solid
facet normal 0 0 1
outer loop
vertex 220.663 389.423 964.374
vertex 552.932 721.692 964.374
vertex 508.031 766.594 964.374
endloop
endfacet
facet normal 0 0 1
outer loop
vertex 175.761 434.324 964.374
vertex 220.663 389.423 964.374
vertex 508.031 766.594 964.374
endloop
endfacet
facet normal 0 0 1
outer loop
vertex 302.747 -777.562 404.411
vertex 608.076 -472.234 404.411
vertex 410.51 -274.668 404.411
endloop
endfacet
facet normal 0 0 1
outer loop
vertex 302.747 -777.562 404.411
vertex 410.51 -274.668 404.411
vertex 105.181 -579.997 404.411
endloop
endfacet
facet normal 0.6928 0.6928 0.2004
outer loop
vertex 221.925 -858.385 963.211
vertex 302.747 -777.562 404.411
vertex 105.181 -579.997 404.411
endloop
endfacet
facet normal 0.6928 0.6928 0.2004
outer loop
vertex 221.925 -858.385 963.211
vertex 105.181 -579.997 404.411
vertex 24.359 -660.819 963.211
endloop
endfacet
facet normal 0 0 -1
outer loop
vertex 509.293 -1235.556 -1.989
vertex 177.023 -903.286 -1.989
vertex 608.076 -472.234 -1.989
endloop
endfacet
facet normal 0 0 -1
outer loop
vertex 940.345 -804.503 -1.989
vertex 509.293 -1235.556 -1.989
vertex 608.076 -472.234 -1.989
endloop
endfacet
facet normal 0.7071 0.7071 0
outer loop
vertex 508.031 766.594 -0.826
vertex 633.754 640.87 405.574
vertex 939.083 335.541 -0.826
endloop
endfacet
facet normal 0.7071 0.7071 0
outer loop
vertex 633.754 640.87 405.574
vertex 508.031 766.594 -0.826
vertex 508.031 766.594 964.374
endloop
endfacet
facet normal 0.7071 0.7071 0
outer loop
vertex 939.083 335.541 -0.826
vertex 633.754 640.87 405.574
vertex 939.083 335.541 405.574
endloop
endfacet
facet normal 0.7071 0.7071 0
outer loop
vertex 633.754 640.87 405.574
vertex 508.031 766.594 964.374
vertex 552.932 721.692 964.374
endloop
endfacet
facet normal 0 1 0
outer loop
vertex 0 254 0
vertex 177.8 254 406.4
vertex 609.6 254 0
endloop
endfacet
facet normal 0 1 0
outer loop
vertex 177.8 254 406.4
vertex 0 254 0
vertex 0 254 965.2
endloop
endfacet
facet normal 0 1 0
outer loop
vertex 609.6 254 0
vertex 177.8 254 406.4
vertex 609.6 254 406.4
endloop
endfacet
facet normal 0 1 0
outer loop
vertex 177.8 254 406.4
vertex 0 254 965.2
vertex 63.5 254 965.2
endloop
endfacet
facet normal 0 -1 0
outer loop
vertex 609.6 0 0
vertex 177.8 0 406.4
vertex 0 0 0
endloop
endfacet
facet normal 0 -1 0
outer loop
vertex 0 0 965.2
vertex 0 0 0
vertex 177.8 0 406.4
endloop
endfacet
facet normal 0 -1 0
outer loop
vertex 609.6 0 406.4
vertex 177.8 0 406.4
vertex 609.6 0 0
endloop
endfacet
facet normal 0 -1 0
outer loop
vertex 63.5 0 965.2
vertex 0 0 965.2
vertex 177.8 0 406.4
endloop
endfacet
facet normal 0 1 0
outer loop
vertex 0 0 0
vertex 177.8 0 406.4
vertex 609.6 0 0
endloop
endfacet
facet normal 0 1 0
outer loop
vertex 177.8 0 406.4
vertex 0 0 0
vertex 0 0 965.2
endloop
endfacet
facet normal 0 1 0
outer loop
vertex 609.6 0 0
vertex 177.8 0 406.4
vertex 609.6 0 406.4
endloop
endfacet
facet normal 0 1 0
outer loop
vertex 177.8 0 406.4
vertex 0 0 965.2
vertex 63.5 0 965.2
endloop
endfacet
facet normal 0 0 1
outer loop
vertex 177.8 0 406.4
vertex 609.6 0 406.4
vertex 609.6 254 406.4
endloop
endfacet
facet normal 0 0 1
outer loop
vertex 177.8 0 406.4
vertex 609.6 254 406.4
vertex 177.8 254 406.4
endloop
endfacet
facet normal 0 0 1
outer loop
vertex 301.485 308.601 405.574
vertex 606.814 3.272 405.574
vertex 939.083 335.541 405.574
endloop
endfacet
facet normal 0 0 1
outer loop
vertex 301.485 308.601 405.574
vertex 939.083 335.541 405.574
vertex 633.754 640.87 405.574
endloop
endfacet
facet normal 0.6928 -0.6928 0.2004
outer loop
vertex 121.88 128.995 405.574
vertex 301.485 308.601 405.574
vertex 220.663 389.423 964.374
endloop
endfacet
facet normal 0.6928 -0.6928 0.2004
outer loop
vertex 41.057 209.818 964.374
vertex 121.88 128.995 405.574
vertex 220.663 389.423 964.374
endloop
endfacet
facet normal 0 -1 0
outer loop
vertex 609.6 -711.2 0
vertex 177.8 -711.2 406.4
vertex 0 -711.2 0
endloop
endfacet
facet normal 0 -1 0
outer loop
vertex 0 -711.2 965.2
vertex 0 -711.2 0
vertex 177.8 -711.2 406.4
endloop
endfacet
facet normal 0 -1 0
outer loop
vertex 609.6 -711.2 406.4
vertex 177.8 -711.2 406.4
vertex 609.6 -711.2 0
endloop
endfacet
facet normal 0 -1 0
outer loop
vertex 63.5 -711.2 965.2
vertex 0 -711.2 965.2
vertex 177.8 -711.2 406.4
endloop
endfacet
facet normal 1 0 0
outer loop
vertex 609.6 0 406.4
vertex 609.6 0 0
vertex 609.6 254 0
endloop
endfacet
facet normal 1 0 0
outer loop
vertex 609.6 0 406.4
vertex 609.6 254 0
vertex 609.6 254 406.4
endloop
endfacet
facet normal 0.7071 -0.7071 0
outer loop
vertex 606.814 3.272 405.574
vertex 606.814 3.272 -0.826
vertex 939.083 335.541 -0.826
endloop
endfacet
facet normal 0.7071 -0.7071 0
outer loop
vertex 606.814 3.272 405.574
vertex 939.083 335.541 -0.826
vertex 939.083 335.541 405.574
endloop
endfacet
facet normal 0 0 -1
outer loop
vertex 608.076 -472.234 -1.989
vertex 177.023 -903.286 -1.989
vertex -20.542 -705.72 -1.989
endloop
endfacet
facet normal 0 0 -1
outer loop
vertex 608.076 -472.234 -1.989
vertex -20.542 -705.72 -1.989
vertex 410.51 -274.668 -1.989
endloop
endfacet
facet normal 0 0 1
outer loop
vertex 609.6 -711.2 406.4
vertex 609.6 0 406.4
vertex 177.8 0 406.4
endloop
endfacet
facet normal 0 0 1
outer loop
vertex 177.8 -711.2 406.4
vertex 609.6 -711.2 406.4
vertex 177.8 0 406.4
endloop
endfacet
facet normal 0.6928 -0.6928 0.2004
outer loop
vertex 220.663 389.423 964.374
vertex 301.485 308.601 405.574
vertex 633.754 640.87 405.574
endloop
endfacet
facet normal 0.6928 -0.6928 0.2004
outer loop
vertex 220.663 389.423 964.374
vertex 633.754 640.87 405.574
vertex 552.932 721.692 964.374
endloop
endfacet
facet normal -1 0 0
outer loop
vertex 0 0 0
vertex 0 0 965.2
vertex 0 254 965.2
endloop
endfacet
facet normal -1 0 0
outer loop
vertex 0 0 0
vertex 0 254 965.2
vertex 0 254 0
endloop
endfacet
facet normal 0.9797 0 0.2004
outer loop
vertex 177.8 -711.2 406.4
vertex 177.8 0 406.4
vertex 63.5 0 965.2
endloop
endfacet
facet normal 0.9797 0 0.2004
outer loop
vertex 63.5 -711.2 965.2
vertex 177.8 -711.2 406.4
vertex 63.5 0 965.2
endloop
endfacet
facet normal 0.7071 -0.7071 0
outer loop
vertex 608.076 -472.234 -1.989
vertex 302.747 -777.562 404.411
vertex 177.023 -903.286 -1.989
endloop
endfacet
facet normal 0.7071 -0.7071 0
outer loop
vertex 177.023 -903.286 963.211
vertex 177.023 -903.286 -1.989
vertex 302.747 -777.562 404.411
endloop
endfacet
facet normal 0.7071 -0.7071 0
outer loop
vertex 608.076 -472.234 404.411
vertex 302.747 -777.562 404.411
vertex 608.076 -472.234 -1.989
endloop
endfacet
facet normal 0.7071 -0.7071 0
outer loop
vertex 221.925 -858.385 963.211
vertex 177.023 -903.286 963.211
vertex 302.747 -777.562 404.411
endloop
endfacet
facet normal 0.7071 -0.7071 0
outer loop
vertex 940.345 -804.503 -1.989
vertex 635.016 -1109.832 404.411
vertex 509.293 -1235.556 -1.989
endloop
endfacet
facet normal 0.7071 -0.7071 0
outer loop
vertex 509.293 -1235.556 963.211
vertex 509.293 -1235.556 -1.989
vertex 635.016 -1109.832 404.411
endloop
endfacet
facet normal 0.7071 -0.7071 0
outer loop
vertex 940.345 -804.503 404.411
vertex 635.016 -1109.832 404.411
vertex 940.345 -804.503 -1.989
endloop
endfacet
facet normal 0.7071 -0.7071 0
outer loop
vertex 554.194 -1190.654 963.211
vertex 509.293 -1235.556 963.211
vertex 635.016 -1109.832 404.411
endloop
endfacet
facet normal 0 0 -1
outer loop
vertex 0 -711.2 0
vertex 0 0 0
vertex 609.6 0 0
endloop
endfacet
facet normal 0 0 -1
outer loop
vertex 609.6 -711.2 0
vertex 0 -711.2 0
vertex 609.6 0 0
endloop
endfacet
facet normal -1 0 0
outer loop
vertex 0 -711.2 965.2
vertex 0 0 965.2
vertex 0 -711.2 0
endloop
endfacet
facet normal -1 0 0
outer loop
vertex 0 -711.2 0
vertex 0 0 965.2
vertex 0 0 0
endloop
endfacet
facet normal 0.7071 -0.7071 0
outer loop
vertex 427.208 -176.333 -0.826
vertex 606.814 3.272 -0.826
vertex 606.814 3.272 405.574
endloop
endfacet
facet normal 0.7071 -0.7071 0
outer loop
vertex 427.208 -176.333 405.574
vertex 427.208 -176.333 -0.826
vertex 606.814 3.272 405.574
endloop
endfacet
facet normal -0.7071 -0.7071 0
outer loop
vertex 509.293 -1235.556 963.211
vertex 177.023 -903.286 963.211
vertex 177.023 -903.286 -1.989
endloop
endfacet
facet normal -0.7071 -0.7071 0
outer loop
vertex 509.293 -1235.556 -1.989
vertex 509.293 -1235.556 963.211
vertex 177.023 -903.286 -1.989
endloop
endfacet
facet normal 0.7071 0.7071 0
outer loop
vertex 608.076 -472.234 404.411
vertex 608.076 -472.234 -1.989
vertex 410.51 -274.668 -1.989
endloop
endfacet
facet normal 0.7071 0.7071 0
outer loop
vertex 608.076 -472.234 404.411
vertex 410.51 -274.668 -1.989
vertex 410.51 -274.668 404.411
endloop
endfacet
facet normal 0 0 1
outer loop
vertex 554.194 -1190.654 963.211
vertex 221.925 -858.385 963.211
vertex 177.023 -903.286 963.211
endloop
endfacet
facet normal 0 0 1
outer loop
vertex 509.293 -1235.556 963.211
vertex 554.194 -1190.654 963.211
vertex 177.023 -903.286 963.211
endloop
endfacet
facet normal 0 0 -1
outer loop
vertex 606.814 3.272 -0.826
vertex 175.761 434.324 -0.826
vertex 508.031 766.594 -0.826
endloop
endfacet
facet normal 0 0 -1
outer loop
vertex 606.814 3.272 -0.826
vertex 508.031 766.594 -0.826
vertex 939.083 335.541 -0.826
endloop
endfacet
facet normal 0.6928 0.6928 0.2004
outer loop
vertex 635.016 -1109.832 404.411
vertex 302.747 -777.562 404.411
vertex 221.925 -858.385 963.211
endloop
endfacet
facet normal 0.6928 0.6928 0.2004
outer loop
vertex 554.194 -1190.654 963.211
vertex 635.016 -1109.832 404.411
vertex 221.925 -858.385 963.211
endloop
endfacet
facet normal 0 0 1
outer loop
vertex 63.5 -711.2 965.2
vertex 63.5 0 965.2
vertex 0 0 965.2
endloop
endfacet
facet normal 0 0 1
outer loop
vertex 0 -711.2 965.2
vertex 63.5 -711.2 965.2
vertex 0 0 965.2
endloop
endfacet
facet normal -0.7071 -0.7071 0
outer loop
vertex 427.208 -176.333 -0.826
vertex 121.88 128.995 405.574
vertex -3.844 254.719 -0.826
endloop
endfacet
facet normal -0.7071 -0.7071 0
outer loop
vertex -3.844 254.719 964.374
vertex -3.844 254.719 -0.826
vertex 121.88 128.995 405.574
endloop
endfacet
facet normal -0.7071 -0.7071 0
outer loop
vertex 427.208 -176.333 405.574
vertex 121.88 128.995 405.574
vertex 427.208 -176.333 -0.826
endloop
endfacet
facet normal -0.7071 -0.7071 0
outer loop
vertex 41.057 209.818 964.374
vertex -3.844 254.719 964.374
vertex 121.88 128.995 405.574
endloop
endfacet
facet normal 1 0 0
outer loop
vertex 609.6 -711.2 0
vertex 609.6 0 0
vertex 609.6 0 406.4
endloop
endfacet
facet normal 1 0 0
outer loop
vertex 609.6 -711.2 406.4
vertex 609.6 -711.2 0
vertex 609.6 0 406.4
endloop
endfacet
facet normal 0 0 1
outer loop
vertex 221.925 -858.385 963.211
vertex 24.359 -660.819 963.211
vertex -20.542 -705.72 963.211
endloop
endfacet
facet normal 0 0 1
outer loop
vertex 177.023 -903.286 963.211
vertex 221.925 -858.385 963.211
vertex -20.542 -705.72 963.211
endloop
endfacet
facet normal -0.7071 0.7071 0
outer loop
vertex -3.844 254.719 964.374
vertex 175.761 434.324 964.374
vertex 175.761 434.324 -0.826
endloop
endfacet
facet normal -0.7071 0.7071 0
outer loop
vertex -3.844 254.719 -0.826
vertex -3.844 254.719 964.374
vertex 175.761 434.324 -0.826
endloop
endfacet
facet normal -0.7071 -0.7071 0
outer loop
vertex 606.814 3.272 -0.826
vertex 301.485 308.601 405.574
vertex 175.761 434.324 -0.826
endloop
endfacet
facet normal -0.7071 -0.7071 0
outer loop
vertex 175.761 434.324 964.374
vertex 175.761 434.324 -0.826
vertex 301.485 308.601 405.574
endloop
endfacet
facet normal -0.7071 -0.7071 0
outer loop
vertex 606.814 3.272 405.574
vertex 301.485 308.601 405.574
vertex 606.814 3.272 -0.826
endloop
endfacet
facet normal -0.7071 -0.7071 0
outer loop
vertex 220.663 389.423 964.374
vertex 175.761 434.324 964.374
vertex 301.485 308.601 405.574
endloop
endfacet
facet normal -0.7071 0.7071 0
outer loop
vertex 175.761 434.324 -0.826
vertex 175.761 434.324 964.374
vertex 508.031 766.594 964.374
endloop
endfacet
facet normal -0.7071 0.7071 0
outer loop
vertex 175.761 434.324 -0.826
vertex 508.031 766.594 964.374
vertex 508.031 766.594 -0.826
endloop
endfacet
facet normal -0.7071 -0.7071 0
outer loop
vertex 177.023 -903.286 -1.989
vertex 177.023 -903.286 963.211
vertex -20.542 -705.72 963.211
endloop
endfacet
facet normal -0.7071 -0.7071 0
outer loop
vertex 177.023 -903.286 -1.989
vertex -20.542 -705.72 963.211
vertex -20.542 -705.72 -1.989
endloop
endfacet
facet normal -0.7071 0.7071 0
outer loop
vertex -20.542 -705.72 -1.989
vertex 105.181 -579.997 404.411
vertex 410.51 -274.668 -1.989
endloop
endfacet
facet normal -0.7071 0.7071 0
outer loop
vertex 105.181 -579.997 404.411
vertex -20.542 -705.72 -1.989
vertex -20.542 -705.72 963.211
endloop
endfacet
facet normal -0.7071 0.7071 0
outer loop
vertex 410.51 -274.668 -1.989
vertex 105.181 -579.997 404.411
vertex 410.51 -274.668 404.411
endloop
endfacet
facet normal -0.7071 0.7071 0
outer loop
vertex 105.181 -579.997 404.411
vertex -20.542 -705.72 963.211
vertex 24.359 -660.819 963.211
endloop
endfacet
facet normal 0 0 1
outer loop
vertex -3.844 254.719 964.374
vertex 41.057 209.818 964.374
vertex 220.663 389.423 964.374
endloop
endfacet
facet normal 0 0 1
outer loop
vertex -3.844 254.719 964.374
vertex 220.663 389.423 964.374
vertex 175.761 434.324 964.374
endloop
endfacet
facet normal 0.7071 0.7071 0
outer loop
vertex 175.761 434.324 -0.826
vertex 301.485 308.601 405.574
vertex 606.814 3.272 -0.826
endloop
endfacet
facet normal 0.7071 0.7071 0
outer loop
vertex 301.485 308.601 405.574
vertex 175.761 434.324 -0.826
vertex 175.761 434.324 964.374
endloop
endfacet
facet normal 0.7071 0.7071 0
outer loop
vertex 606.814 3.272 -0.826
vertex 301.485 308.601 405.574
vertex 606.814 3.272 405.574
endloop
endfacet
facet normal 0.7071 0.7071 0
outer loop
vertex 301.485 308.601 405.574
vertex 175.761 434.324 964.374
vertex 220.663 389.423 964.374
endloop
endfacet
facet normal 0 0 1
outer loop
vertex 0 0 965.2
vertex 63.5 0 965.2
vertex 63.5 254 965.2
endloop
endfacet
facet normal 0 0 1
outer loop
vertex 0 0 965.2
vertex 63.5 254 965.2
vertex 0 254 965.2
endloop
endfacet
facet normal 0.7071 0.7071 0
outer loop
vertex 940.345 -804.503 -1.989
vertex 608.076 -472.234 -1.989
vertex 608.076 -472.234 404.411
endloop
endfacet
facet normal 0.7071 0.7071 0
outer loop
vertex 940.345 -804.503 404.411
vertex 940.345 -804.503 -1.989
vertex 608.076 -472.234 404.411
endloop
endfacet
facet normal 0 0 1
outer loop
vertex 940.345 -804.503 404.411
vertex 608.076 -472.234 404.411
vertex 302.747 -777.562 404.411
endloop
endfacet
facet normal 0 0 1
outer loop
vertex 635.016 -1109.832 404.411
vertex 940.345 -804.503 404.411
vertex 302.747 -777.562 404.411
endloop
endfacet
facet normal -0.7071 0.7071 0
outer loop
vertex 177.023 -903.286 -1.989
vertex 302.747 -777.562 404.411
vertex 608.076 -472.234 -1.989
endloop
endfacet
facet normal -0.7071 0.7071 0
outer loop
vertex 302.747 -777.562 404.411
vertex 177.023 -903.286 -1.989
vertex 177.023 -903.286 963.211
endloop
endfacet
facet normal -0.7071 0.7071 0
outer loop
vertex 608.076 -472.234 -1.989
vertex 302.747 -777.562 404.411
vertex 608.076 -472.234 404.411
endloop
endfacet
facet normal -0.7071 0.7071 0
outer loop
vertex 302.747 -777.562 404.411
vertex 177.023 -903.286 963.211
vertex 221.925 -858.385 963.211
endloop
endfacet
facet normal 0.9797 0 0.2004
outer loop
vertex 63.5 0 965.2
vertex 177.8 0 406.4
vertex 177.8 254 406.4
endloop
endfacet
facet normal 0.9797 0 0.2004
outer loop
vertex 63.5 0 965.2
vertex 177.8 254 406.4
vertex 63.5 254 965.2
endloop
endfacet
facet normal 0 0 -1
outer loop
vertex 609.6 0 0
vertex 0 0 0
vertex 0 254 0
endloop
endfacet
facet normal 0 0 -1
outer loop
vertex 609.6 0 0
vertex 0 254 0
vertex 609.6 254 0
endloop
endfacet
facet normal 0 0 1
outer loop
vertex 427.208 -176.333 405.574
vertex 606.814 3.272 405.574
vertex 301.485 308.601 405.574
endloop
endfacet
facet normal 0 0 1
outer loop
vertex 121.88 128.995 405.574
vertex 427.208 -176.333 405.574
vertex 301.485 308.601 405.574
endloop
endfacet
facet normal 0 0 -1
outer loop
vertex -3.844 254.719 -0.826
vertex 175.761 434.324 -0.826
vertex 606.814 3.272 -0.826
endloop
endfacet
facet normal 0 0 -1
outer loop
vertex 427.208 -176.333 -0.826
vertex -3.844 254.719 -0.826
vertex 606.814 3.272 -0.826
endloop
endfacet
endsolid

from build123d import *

# Parameters (mm, degrees)
F1_DEPTH  = 711.2
F5_DEPTH  = 469.9
F9_DEPTH  = 469.9
F10_DEPTH = 279.4
F11_DEPTH = 254
F12_DEPTH = 254


with BuildPart() as f1:
    # F0 (on Front) → F1 (new body)
    with BuildSketch(Plane.XZ):
        Polygon((0, 965.2), (0, 0), (609.6, 0), (609.6, 406.4), (177.8, 406.4), (63.5, 965.2), align=None)
    extrude(amount=F1_DEPTH)


with BuildPart() as f5:
    # F4 (on face) → F5 (new body)
    with BuildSketch(Plane(origin=(305.0427138805, 305.0427138805, 0), x_dir=(0.7071067812, -0.7071067812, 0), z_dir=(-0.7071067812, -0.7071067812, 0))):
        Polygon((-182.8315850894, 964.3738703728), (-182.8315850894, -0.8261296272), (426.7684149106, -0.8261296272), (426.7684149106, 405.5738703728), (-5.0315850894, 405.5738703728), (-119.3315850894, 964.3738703728), align=None)
    extrude(amount=-F5_DEPTH)


with BuildPart() as f9:
    # F8 (on face) → F9 (new body)
    with BuildSketch(Plane(origin=(540.15468995, -540.15468995, 0), x_dir=(0.7071067812, 0.7071067812, 0), z_dir=(0.7071067812, -0.7071067812, 0))):
        Polygon((-513.5452967683, 963.2110228688), (-513.5452967683, -1.9889771312), (96.0547032317, -1.9889771312), (96.0547032317, 404.4110228688), (-335.7452967683, 404.4110228688), (-450.0452967683, 963.2110228688), align=None)
    extrude(amount=F9_DEPTH)


with BuildPart() as f10:
    # F10 (new): a face of the model
    f10_faces = [f9.part.faces().sort_by_distance(p)[0] for p in [
        (356.2515923396, -724.0577875605, 295.0116369936),
    ]]
    extrude(f10_faces, amount=F10_DEPTH)


with BuildPart() as f11:
    # F11 (new): a face of the model
    f11_faces = [f5.part.faces().sort_by_distance(p)[0] for p in [
        (354.9895244297, 255.0959033314, 296.1744844976),
    ]]
    extrude(f11_faces, amount=F11_DEPTH)


with BuildPart() as f12:
    # F12 (new): a face of the model
    f12_faces = [f1.part.faces().sort_by_distance(p)[0] for p in [
        (253.4670419652, 0, 297.0006141249),
    ]]
    extrude(f12_faces, amount=F12_DEPTH)


solid = Compound([f1.part, f5.part, f9.part, f10.part, f11.part, f12.part])
